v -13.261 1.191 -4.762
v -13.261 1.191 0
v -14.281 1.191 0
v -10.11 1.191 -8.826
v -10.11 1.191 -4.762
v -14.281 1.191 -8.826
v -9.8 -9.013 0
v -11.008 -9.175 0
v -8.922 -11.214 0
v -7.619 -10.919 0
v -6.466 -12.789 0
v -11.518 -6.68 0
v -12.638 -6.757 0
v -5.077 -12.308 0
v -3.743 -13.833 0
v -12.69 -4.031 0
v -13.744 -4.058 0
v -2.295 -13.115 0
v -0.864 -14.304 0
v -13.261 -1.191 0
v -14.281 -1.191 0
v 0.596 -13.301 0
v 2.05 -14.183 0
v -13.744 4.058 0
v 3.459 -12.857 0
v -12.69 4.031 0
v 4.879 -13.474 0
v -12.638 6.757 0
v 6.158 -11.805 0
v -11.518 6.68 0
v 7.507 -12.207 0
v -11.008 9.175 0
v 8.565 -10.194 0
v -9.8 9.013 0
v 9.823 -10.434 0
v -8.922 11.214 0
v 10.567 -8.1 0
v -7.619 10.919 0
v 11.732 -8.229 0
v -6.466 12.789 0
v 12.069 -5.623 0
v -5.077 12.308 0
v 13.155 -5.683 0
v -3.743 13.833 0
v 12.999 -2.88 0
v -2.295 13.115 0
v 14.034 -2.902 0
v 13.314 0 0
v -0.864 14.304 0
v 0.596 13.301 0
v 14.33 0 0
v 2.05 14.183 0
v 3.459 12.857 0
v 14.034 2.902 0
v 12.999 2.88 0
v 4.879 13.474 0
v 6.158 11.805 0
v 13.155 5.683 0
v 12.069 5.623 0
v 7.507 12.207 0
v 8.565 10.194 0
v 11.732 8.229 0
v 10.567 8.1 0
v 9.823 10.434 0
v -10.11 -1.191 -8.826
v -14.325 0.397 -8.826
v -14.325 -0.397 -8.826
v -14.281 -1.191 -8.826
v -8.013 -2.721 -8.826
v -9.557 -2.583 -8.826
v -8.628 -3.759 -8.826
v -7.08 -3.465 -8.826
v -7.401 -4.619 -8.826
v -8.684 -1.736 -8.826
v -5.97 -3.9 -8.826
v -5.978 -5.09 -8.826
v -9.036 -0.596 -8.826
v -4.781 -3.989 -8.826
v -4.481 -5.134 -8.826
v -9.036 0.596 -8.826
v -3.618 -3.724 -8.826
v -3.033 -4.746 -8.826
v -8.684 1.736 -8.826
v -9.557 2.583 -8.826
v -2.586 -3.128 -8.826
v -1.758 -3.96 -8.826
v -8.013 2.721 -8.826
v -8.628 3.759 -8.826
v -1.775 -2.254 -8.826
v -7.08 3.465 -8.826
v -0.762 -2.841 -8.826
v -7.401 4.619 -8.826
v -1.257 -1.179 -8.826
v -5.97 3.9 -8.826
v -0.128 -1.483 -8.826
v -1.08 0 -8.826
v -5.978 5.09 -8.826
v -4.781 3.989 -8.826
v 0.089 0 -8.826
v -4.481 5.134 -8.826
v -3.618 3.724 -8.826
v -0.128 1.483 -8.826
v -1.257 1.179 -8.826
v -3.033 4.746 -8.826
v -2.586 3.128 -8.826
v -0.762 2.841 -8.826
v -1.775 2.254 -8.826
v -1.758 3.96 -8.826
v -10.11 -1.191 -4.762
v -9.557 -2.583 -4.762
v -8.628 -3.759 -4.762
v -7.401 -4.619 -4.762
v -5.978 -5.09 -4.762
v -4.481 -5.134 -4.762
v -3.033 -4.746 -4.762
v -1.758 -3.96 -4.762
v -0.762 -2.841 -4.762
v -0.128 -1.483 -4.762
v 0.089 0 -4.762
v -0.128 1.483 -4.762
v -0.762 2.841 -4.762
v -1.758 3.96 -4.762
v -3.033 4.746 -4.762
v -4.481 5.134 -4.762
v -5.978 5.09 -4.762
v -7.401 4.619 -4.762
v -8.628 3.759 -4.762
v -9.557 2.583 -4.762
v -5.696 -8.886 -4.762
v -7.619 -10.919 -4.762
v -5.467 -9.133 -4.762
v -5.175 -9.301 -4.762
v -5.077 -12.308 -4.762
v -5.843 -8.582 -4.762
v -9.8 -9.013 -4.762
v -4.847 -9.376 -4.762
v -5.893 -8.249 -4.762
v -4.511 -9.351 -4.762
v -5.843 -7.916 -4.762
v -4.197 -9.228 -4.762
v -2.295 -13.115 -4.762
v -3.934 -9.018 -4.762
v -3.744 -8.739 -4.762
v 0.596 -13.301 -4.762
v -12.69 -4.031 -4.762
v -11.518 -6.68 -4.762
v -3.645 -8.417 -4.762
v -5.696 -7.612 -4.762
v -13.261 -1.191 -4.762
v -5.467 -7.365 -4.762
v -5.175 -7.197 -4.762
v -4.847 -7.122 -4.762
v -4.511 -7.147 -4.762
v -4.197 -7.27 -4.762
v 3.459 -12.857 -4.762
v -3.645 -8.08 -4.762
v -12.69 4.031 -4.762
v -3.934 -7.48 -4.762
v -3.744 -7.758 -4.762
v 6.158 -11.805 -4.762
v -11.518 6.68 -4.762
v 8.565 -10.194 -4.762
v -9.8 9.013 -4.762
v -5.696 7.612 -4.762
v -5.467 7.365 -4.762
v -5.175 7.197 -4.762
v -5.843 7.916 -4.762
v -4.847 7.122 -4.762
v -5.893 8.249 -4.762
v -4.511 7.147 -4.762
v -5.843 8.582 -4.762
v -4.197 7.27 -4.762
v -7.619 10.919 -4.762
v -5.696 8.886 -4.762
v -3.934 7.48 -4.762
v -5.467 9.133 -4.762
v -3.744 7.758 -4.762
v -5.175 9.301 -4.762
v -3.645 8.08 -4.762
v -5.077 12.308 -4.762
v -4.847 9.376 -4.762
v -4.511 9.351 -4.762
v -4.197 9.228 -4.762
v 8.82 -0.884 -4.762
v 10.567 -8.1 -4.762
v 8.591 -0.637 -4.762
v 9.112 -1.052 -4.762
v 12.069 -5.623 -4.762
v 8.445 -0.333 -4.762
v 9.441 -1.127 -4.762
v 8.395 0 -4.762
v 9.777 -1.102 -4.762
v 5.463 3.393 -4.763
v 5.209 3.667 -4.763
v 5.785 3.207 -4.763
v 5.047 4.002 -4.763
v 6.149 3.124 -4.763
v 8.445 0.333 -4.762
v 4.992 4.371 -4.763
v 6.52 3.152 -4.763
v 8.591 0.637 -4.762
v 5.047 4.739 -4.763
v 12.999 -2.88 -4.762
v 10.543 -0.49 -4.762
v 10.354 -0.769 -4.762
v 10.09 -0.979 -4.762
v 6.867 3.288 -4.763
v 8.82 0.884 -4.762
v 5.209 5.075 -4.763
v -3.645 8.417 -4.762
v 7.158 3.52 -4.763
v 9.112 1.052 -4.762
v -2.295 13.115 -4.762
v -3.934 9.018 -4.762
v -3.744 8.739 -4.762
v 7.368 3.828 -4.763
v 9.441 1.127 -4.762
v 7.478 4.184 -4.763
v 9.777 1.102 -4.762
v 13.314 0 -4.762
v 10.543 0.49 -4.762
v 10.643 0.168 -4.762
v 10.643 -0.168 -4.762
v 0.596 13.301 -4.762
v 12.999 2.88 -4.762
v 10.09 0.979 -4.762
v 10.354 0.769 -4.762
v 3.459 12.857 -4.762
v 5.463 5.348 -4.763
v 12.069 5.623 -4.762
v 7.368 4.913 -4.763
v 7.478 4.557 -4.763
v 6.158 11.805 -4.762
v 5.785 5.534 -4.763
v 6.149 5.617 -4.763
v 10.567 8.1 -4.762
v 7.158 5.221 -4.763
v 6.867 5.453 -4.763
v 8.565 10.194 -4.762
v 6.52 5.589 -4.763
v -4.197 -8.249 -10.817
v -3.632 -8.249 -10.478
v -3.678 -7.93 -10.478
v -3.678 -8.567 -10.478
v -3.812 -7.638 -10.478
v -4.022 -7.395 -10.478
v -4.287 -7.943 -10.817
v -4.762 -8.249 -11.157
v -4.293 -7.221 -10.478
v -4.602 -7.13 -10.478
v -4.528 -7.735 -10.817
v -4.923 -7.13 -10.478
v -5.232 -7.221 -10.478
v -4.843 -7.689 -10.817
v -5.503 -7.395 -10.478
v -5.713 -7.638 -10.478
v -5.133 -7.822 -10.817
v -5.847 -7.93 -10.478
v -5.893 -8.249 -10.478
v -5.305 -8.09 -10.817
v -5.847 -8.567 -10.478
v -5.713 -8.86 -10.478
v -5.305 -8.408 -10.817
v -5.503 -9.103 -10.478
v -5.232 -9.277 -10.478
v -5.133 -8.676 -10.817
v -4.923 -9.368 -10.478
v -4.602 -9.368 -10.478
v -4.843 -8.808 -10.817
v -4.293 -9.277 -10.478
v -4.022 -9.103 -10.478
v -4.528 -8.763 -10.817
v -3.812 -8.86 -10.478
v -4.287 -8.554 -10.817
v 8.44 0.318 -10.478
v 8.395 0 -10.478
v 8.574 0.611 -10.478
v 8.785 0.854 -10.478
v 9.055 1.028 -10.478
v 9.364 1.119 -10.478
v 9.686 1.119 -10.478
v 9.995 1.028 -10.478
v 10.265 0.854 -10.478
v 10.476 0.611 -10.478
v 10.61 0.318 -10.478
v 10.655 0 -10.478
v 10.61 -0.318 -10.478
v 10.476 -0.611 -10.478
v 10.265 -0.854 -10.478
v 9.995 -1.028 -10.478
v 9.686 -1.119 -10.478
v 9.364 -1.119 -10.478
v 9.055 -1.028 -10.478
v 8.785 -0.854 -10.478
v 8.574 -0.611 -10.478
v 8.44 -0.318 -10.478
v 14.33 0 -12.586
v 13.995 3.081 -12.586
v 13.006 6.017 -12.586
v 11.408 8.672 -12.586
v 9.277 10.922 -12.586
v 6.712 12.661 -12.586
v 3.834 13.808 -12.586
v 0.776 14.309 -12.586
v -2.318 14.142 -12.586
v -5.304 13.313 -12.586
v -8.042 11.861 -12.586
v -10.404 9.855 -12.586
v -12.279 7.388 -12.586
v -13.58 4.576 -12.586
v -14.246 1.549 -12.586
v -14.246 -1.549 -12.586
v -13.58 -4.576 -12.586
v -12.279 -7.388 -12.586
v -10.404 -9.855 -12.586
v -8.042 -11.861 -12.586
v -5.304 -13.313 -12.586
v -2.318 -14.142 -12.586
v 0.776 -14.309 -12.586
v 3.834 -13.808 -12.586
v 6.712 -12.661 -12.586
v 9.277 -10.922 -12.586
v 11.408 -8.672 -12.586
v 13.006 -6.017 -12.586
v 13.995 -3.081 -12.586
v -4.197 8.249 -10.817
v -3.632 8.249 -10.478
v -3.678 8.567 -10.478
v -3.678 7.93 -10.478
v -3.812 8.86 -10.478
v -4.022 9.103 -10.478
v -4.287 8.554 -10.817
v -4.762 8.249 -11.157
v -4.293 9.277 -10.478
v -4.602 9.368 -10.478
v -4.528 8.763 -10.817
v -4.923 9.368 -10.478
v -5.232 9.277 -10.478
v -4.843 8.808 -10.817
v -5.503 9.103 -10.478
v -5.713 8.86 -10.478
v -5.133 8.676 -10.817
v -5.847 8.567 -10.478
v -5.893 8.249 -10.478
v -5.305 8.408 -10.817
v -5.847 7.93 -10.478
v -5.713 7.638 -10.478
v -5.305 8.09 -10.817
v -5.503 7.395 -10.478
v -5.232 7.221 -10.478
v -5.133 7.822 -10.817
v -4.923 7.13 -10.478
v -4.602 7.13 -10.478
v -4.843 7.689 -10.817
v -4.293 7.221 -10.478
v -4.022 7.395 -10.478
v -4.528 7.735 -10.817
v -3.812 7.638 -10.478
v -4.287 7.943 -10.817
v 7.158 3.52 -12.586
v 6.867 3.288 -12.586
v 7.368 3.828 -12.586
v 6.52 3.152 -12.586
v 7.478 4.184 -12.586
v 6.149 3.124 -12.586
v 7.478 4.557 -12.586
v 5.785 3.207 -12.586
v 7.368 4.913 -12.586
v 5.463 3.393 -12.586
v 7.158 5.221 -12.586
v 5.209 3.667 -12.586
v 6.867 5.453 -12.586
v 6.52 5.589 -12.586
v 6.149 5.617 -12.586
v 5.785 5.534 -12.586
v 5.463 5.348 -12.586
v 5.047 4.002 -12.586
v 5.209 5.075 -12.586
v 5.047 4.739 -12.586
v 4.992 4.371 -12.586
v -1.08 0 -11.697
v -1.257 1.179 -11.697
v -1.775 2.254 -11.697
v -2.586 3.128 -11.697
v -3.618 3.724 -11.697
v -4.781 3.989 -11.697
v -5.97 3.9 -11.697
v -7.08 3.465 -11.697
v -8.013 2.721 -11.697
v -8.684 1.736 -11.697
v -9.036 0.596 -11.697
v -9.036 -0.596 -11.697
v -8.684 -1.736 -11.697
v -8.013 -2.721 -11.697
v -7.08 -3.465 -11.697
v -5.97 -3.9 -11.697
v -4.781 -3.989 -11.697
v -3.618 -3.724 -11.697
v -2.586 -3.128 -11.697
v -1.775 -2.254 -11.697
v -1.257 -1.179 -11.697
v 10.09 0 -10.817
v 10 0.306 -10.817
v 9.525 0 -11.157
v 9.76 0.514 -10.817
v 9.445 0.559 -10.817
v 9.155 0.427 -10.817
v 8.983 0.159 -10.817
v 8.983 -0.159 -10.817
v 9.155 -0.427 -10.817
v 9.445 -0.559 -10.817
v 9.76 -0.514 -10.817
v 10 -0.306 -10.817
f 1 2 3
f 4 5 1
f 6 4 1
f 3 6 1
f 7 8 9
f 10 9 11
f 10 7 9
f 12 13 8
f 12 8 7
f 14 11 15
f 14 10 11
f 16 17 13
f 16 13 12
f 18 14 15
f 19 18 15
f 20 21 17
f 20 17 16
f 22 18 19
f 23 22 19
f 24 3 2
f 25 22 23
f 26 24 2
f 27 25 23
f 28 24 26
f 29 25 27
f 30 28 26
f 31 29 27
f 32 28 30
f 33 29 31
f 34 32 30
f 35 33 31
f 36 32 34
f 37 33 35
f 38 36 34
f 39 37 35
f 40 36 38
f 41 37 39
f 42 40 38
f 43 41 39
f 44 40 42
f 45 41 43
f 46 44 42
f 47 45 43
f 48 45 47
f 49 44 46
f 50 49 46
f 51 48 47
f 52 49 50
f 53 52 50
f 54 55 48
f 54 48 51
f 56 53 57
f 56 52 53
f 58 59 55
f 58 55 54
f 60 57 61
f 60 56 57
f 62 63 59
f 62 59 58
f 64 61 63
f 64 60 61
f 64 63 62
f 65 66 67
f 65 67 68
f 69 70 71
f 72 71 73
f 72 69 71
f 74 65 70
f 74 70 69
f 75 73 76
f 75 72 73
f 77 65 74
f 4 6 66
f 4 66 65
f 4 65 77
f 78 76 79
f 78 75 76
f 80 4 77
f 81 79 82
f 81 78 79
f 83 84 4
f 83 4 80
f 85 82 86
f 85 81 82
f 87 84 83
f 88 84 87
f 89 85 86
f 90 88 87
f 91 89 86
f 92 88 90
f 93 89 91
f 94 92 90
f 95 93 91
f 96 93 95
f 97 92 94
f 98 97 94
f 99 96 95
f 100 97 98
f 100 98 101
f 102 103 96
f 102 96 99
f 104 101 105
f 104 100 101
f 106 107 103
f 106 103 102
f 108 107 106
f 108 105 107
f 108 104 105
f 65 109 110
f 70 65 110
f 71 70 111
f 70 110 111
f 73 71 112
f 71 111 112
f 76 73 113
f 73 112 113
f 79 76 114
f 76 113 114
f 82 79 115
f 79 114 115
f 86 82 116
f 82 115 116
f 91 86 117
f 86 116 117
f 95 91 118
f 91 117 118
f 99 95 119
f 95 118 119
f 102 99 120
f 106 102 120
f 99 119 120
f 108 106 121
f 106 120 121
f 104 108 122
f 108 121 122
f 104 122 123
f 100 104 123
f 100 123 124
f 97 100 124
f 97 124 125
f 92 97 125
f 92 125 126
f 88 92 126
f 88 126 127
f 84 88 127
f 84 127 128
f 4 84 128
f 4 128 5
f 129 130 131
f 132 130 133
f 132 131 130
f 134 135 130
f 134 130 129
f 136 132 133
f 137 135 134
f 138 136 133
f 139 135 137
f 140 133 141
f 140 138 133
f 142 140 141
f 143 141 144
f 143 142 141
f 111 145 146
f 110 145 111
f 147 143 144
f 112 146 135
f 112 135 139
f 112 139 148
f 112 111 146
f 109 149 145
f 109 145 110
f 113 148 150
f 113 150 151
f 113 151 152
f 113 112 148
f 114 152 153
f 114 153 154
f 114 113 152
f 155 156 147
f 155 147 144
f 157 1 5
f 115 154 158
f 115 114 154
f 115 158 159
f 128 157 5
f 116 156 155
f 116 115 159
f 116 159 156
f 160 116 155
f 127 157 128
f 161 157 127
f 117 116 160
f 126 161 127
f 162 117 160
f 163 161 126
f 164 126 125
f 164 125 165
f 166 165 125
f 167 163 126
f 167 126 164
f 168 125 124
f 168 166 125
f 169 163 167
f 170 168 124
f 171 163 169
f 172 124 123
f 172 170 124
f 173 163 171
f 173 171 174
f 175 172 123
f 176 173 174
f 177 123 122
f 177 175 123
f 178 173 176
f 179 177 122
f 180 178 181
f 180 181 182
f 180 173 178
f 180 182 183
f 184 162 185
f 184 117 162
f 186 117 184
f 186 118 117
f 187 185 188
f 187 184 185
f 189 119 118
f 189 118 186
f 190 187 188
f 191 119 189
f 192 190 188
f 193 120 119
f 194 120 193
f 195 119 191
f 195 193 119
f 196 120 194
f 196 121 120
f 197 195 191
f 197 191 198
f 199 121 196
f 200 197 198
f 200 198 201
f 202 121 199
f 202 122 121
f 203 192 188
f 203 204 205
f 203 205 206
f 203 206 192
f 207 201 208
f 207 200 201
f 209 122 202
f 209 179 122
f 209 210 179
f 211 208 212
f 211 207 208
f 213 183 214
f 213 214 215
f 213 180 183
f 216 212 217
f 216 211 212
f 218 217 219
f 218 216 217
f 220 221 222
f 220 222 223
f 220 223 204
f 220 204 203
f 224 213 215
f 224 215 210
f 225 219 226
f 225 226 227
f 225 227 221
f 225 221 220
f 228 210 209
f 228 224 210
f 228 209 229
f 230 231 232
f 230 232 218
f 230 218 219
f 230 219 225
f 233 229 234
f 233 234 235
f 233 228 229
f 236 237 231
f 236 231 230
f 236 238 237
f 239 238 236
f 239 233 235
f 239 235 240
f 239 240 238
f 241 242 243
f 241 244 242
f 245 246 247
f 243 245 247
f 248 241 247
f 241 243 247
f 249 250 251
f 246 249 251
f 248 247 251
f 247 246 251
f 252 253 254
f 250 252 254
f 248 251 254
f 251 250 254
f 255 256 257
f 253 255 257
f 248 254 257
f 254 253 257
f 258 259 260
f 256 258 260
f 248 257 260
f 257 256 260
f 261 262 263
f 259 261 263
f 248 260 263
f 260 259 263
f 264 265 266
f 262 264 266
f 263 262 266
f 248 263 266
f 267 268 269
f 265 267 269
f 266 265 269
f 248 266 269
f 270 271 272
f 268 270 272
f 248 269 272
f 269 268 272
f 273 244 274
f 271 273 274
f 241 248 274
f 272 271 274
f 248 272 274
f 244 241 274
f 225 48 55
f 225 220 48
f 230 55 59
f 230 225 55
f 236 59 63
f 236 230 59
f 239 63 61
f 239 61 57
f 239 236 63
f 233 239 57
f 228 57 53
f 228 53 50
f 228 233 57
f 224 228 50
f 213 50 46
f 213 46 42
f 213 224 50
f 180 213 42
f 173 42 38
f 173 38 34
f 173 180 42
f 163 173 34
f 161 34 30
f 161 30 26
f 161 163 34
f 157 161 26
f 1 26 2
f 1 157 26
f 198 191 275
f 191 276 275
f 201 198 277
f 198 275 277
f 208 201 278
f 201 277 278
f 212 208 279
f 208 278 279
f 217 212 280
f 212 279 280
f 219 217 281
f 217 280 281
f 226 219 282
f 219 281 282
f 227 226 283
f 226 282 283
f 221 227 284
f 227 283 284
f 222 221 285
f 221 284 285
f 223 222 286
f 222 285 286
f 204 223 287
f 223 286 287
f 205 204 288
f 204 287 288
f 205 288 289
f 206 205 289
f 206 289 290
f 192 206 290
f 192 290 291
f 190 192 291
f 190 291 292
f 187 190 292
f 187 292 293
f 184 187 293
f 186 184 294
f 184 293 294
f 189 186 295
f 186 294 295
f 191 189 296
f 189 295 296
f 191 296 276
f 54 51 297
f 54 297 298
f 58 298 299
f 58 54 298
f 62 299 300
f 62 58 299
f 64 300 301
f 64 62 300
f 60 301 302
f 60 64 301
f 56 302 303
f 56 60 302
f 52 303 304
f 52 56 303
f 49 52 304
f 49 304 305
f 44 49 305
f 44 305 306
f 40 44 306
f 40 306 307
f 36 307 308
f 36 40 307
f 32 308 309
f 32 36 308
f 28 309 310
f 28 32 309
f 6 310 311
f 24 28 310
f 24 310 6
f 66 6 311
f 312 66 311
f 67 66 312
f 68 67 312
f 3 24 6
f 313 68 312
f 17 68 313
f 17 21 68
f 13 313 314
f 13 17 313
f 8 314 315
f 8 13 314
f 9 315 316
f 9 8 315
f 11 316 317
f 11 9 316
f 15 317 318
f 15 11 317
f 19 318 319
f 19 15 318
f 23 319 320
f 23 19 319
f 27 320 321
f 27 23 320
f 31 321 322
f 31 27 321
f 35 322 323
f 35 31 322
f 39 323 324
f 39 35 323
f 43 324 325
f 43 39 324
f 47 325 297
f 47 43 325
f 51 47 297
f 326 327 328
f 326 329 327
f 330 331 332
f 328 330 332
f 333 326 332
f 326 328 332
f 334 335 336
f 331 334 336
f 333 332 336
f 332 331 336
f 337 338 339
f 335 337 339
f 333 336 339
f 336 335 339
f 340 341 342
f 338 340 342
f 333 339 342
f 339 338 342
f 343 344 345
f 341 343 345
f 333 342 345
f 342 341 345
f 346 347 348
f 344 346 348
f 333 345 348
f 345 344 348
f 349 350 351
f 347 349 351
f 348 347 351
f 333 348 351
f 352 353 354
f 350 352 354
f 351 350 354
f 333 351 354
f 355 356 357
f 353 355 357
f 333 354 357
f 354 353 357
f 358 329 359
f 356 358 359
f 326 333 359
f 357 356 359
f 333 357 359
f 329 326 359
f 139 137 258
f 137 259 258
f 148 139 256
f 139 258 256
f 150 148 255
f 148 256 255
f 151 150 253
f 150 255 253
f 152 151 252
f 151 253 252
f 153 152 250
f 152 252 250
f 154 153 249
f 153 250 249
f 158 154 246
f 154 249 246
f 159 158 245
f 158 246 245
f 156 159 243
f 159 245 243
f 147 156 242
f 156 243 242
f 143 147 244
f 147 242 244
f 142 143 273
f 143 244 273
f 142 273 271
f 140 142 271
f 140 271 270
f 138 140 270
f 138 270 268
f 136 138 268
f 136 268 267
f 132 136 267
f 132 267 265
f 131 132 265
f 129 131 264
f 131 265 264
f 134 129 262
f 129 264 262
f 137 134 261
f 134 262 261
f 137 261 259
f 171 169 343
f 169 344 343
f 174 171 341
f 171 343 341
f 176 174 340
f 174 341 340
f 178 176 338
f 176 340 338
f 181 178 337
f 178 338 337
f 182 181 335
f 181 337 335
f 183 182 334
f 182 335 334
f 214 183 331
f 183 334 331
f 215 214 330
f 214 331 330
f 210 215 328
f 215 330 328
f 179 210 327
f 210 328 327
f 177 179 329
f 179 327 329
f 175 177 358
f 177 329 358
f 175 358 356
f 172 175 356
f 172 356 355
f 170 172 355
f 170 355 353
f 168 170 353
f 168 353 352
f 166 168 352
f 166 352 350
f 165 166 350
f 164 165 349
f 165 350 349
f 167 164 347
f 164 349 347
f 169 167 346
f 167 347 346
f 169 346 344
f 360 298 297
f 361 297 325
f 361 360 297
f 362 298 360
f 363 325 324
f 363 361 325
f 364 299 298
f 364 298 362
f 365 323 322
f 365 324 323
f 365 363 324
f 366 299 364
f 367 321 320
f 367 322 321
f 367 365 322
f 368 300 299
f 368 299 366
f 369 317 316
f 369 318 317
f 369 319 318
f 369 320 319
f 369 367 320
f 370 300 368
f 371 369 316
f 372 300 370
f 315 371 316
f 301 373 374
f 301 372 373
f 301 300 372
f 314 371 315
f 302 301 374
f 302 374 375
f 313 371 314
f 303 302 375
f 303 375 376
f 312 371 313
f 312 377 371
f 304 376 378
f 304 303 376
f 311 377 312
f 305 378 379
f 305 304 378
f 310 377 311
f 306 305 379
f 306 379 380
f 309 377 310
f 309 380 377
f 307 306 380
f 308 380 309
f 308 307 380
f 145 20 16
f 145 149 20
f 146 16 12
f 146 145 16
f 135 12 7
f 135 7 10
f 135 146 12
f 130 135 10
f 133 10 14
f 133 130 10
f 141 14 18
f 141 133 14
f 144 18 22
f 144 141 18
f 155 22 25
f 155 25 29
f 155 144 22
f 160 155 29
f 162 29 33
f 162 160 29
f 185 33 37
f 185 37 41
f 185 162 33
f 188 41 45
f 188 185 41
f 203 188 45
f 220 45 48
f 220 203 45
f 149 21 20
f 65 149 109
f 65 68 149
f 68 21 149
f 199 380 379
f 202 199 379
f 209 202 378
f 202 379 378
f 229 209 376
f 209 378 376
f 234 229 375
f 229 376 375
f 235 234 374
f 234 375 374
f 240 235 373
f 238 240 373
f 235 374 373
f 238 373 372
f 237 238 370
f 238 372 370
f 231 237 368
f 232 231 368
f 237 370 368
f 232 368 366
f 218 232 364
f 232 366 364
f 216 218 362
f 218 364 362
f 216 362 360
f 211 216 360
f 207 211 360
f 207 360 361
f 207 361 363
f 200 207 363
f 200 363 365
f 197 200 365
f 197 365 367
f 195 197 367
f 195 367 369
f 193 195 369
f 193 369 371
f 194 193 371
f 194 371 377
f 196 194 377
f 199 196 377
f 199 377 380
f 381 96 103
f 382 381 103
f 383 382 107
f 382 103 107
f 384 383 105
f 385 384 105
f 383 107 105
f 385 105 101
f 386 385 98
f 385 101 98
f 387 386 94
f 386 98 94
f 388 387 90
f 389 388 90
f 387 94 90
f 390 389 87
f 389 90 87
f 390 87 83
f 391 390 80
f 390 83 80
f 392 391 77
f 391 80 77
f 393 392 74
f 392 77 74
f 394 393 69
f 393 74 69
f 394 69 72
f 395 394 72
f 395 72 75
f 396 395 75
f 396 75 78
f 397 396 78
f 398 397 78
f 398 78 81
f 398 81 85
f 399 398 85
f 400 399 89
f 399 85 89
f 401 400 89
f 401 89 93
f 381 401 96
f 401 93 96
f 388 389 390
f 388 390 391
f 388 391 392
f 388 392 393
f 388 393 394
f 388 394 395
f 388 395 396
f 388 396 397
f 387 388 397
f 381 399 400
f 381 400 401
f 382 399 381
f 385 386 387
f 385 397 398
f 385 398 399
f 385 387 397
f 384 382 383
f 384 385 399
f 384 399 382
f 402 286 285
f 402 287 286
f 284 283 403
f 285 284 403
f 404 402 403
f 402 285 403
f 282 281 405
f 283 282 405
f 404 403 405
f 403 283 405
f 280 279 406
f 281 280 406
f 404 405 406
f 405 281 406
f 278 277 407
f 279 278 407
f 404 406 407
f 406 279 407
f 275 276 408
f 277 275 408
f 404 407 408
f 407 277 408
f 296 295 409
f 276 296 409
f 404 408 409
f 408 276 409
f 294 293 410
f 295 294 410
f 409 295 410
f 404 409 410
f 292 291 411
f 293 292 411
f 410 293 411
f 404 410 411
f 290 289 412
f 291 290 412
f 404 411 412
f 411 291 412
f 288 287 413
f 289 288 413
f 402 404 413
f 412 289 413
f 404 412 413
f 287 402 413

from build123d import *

# Parameters (mm, degrees)
F3_D     = 2.2606
F3_DEPTH = 5.715
F3_TIP   = 0.6791527577
F4_R     = 5.1689
F5_DEPTH = 4.064
F6_R     = 4.0005
F7_DEPTH = 2.8702
F9_DEPTH = 25.4
F11_D    = 2.5


with BuildPart() as f1:
    # F0 (on Front) → F1 (revolve)
    with BuildSketch(Plane.XZ):
        Polygon((14.330415332, -12.5857), (14.330415332, 0), (13.314415332, 0), (13.314415332, -4.7625), (0, -4.7625), (0, -12.5857), align=None)
    revolve(axis=Axis((0, 0, -8.6741), (0, 0, 1)))

    # F3
    with Locations(Plane.XY.offset(-4.7625)):
        with Locations((9.525, 0), (-4.7625, 8.248891971), (-4.7625, -8.248891971)):
            Hole(F3_D / 2, depth=F3_DEPTH)
            with Locations((0, 0, -(F3_DEPTH + F3_TIP / 2))):  # 118° drill point
                Cone(0, F3_D / 2, F3_TIP, mode=Mode.SUBTRACT)

    # F4 (on face) → F5 (cut)
    with BuildSketch(Plane.XY.offset(-4.7625)):
        with Locations((-5.08, 0)):
            Circle(F4_R)
    extrude(amount=-F5_DEPTH, mode=Mode.SUBTRACT)

    # F6 (on face) → F7 (cut)
    with BuildSketch(Plane.XY.offset(-8.8265)):
        with Locations((-5.08, 0)):
            Circle(F6_R)
    extrude(amount=-F7_DEPTH, mode=Mode.SUBTRACT)

    # F8 (on face) → F9 (cut)
    with BuildSketch(Plane.XY.offset(-8.8265)):
        with BuildLine():
            ThreePointArc((-10.109904504, -1.190625), (-10.2489, 0), (-10.109904504, 1.190625))
            Line((-10.109904504, 1.190625), (-15.529622134, 1.190625))
            Line((-15.529622134, 1.190625), (-15.529622134, -1.190625))
            Line((-15.529622134, -1.190625), (-10.109904504, -1.190625))
        make_face()
    extrude(amount=F9_DEPTH, mode=Mode.SUBTRACT)

    # F11 (through all)
    with Locations(Plane.XY.offset(-4.7625)):
        with Locations((6.2419385775, 4.370652445)):
            Hole(F11_D / 2)


solid = f1.part
